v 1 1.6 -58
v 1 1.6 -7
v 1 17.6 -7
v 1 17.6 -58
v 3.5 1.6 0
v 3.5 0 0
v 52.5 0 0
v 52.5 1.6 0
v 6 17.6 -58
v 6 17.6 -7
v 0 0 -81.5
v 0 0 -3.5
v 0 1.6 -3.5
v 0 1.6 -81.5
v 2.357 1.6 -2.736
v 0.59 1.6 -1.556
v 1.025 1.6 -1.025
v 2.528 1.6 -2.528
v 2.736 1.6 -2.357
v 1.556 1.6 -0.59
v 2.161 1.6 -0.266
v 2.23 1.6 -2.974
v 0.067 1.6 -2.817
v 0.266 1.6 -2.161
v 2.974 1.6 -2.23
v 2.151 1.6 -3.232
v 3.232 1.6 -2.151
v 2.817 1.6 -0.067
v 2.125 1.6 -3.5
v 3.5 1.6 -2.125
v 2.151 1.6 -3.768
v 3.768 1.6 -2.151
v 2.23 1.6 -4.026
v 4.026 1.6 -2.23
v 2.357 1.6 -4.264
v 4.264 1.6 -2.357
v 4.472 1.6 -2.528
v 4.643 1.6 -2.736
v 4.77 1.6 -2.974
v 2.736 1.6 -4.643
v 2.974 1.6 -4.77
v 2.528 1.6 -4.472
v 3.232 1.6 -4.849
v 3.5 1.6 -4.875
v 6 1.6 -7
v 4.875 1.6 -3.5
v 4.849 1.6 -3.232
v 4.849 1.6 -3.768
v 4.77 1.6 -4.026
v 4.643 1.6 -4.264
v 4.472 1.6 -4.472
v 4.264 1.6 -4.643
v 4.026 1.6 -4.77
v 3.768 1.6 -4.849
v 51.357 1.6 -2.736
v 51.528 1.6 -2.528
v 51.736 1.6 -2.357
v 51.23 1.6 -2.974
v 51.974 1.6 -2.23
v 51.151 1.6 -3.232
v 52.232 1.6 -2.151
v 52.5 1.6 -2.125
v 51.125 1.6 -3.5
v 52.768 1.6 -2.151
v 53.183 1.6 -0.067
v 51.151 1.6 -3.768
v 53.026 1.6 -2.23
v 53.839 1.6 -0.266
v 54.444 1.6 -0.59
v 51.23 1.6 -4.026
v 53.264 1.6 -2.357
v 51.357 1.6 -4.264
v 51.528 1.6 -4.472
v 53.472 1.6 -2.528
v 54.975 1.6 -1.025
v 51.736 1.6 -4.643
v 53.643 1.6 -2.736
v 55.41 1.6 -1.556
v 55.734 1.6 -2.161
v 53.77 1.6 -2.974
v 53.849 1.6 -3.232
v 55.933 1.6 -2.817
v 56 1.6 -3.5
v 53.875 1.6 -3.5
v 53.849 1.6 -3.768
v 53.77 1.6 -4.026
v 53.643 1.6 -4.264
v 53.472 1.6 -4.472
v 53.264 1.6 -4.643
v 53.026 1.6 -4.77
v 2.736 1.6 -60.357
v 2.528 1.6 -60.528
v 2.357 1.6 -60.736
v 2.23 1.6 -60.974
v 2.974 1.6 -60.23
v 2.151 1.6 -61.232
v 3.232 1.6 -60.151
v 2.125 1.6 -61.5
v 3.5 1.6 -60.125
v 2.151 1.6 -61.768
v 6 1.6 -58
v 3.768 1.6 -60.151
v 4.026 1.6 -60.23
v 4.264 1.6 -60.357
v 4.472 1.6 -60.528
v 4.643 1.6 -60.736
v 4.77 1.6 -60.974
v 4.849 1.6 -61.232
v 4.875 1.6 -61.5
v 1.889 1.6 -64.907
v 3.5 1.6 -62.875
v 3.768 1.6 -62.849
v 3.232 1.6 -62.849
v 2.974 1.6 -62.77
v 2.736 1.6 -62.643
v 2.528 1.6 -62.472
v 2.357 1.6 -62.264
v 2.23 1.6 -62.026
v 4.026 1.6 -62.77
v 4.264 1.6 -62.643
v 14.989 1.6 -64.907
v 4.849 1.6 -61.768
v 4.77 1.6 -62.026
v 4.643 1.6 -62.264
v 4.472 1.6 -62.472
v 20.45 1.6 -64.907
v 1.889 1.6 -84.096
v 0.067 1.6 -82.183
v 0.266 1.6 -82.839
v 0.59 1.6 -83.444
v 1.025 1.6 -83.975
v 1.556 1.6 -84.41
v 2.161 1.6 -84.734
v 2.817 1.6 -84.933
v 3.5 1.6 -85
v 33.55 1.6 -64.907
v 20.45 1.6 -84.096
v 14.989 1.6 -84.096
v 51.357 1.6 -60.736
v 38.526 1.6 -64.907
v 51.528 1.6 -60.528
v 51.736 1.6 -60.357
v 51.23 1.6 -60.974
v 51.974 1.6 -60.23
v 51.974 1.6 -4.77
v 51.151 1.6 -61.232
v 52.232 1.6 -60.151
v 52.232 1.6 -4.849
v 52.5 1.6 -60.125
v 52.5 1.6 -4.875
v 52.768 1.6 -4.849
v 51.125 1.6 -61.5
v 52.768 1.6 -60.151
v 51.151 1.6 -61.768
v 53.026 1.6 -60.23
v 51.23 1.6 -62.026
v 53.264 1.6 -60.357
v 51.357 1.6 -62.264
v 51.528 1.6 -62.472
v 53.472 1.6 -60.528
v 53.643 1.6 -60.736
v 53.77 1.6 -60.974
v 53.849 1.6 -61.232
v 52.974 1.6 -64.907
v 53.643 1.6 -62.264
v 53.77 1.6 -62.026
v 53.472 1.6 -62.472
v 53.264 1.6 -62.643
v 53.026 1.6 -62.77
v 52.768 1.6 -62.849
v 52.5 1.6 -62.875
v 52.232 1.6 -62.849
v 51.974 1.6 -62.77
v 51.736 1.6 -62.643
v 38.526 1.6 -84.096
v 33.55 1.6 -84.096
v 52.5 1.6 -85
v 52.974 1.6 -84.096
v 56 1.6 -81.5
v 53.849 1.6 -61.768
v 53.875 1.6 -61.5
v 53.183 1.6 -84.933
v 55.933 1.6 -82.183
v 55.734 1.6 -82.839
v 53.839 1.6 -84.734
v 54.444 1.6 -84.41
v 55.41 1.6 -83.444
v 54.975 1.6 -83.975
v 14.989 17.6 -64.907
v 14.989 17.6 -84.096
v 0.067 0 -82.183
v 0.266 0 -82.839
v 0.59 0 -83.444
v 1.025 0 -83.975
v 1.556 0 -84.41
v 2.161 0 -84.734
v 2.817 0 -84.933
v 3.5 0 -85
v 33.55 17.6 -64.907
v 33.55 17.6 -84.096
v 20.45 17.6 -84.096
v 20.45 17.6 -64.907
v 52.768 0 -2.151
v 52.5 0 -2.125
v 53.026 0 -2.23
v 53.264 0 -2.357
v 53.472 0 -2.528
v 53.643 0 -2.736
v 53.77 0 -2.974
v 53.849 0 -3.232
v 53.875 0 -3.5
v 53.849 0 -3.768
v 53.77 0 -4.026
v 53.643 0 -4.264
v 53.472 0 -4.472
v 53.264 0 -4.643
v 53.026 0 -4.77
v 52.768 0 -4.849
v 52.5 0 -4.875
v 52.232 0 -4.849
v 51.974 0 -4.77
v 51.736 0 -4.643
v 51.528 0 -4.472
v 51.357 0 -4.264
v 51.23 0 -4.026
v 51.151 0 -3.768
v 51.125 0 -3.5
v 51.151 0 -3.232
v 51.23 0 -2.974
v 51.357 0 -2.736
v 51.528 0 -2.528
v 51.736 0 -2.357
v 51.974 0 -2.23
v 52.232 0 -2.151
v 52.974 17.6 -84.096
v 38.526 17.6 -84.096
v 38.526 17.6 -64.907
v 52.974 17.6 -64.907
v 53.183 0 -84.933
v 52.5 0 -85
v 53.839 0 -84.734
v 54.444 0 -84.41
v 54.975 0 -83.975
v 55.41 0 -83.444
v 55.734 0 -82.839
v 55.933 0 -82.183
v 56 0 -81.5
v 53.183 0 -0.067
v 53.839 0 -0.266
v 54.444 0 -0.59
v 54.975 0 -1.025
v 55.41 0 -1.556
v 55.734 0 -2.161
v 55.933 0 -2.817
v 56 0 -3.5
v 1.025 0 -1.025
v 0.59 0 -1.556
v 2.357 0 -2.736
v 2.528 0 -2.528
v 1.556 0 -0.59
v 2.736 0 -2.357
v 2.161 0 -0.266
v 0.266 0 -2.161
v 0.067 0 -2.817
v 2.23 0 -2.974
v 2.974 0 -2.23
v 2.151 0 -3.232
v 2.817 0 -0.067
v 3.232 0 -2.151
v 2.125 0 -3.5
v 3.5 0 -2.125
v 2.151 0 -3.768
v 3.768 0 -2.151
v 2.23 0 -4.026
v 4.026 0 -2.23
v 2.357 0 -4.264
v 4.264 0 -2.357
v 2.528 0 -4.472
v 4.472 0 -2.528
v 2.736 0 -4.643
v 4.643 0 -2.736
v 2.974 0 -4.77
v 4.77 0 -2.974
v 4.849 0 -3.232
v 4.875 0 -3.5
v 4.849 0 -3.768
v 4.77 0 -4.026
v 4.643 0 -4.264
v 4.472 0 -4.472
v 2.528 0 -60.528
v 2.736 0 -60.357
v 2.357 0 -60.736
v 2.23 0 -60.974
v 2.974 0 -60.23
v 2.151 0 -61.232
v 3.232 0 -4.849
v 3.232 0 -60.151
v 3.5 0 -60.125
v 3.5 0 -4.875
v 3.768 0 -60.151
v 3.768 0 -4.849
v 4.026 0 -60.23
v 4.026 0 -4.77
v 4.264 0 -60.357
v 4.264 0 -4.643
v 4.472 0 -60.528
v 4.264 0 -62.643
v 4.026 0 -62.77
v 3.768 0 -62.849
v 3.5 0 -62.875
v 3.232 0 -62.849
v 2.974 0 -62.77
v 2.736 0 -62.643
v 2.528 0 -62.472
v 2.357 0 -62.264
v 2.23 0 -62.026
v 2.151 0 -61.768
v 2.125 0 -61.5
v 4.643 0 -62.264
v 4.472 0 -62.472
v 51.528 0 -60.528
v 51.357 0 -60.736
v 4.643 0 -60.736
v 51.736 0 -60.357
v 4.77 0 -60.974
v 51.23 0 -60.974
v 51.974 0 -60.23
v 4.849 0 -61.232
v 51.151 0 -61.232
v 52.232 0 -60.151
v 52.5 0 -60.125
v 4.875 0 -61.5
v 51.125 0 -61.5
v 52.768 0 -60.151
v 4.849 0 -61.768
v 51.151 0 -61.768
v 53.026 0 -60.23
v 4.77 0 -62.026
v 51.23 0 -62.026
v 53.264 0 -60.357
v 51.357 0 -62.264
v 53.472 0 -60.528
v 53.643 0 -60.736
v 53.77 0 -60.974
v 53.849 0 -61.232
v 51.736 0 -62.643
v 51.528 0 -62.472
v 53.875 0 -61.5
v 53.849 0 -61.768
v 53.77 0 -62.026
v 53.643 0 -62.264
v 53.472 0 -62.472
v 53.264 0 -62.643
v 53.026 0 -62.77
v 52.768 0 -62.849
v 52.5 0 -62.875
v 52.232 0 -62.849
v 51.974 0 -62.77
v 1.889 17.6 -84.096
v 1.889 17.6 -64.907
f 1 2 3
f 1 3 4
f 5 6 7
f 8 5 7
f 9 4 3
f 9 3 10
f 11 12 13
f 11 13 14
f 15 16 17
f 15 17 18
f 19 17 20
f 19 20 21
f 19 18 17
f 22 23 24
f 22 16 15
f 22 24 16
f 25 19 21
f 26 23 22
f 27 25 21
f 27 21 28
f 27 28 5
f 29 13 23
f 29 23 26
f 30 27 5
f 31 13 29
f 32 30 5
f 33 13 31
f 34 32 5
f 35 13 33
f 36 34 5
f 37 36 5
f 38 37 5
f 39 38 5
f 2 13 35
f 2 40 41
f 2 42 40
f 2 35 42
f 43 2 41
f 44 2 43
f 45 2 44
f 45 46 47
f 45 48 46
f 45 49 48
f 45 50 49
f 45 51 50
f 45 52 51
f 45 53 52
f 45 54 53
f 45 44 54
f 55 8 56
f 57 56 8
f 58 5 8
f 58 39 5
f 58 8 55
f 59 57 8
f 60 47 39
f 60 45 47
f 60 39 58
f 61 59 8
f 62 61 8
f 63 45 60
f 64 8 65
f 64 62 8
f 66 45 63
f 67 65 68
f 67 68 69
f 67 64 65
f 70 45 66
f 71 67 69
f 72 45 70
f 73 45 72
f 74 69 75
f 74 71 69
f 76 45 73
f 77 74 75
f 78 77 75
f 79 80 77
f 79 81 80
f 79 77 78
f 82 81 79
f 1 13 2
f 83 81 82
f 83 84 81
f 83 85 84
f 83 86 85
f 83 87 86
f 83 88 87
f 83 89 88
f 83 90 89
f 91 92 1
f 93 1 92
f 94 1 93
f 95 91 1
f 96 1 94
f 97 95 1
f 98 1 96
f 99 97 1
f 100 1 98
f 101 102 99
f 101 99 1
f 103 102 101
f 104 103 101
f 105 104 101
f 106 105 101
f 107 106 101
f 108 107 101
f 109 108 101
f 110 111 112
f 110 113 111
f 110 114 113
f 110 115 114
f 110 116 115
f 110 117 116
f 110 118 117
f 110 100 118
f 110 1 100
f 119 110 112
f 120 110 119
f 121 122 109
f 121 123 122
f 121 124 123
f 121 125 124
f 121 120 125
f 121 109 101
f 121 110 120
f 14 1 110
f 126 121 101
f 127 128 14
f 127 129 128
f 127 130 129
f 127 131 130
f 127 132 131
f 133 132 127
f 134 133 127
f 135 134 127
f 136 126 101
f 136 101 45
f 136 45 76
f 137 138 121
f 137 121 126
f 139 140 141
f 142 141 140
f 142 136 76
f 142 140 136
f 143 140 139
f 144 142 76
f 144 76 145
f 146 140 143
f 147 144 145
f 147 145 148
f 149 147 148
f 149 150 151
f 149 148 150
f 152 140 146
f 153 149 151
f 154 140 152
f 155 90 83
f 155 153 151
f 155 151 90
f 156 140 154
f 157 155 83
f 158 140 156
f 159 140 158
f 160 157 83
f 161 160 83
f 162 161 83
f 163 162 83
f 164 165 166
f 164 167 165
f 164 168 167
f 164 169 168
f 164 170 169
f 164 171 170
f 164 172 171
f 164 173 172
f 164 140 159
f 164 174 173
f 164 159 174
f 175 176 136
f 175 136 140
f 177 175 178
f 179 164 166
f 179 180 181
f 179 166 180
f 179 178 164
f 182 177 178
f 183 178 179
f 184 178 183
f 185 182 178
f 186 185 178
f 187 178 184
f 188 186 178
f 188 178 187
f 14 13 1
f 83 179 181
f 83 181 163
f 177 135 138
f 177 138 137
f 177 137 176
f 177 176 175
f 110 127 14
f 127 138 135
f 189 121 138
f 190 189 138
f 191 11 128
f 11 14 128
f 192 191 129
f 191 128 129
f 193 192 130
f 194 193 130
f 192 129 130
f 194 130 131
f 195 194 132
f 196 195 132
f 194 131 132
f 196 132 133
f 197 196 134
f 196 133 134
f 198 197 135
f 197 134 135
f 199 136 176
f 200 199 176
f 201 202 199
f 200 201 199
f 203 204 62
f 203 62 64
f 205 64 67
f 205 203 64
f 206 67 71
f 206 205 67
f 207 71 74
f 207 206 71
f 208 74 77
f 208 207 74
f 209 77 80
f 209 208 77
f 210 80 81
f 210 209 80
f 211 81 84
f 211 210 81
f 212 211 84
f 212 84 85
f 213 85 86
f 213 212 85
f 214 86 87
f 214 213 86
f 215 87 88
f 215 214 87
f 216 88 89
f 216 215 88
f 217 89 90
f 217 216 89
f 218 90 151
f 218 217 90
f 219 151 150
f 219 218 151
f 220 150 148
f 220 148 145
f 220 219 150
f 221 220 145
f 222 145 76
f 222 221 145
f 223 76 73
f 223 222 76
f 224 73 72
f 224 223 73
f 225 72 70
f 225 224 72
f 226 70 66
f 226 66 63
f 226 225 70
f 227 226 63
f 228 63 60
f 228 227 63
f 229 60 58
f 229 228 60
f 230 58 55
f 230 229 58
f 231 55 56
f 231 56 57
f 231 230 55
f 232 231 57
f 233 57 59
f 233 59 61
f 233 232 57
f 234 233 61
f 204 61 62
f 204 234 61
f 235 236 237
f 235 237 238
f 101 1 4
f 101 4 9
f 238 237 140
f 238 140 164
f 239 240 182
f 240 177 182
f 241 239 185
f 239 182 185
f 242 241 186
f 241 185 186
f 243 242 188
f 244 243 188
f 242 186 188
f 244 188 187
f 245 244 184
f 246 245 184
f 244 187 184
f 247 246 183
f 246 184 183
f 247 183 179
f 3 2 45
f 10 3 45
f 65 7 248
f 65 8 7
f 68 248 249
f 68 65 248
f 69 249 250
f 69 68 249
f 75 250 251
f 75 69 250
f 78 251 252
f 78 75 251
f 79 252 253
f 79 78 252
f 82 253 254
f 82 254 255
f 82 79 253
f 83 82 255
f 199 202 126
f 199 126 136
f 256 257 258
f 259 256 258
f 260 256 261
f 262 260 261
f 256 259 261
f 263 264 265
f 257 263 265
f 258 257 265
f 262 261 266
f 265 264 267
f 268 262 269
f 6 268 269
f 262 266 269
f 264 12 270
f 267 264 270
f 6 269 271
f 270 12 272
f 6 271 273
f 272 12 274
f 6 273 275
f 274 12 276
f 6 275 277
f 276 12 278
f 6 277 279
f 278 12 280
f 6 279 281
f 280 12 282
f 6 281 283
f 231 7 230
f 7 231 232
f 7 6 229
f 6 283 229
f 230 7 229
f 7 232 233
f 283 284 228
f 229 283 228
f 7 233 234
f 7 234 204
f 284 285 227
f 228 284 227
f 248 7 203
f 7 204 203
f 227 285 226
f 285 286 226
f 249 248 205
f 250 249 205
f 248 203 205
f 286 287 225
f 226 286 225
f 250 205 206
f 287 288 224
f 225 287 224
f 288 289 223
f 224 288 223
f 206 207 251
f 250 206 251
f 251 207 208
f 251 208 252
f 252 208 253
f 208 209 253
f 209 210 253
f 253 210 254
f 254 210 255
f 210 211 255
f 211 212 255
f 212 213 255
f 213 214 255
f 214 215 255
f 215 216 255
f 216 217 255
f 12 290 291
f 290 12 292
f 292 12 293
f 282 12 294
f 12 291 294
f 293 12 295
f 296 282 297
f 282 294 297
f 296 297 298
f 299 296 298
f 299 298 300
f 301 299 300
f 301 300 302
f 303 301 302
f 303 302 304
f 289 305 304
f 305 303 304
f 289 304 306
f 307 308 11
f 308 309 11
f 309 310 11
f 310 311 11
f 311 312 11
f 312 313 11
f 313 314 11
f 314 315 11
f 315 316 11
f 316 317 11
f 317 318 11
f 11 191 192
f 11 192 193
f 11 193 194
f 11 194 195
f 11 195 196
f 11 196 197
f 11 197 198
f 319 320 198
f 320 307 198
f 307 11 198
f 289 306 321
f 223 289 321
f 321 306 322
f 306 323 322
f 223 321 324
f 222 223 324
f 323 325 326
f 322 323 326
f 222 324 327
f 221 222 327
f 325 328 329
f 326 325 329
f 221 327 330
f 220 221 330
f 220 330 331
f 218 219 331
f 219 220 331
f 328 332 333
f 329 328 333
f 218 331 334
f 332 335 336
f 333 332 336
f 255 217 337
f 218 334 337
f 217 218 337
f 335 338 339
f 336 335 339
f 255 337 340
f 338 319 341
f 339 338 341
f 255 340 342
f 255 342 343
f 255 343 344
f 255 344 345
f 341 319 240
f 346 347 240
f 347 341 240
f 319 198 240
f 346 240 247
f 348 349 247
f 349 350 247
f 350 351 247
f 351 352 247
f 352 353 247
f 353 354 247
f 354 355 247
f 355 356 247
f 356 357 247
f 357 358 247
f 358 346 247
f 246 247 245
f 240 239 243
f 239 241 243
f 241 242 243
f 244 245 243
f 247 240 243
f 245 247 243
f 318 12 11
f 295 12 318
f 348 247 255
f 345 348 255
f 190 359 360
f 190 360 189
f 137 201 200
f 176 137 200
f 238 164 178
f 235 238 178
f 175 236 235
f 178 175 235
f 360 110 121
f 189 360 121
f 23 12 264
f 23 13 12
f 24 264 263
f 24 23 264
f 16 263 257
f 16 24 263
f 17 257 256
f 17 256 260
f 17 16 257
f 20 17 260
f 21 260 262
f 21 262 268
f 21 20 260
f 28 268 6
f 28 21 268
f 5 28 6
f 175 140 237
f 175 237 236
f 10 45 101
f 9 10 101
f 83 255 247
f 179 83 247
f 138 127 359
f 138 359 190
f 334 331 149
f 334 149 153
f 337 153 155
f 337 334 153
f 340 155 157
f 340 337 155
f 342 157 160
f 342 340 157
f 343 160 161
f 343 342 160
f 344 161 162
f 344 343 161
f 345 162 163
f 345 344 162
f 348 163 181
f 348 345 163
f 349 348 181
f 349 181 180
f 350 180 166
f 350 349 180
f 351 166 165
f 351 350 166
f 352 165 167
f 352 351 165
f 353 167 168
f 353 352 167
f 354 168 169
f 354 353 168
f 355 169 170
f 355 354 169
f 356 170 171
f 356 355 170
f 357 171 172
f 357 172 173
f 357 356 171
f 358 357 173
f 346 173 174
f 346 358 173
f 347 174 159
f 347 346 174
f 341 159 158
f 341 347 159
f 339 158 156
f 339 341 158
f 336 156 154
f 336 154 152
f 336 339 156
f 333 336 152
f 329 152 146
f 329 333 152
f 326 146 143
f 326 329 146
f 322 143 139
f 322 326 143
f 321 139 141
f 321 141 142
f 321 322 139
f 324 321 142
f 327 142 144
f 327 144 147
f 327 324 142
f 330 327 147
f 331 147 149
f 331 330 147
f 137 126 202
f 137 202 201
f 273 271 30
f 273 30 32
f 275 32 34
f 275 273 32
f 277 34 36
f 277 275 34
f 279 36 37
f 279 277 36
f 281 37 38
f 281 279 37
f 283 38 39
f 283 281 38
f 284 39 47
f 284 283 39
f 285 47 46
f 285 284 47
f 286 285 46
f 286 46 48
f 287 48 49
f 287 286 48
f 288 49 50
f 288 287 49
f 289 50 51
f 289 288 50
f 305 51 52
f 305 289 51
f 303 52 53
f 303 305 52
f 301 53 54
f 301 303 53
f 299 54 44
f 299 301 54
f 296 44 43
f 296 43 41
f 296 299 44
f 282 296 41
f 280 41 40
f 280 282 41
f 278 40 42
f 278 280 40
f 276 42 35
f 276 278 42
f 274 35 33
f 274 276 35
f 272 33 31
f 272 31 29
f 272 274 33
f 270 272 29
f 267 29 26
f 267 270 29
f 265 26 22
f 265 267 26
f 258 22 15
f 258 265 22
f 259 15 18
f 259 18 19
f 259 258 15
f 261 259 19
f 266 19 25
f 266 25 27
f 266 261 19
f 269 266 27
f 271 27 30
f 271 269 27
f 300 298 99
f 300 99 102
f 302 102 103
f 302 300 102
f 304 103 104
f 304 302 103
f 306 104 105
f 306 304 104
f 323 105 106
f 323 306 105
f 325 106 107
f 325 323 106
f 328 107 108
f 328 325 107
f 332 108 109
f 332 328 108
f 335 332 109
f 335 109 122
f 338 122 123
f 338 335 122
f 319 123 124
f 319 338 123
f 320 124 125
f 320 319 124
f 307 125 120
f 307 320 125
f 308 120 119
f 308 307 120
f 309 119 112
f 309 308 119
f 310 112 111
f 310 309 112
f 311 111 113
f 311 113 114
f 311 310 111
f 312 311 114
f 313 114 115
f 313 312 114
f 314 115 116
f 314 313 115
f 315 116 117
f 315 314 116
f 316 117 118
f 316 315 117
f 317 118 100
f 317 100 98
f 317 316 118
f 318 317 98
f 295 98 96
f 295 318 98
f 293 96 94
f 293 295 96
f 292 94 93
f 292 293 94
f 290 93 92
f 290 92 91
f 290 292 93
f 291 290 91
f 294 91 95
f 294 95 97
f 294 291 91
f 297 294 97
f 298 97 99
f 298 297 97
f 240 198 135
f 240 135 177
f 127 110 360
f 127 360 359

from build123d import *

# Parameters (mm, degrees)
SKETCH1_W           = 56
SKETCH1_H           = 85
SKETCH1_R           = 1.375
BOSS_EXTRUDE1_DEPTH = 1.6
FILLET1_R           = 3.5
SKETCH3_W           = 13.1
SKETCH3_H           = 19.189632287
SKETCH3_W_2         = 14.44866431
BOSS_EXTRUDE2_DEPTH = 16
SKETCH5_W           = 5
SKETCH5_H           = 51
BOSS_EXTRUDE3_DEPTH = 16


with BuildPart() as part:
    # Sketch1 → Boss-Extrude1 (new body)
    with BuildSketch(Plane(origin=(0, 0, 0), x_dir=(1, 0, 0), z_dir=(0, 1, 0))):
        with Locations((28, 42.5)):
            Rectangle(SKETCH1_W, SKETCH1_H)
        with Locations(Location((3.5, 3.5, 0), (0, 0, 270))):
            Circle(SKETCH1_R, mode=Mode.SUBTRACT)
        with Locations(Location((52.5, 3.5, 0), (0, 0, 270))):
            Circle(SKETCH1_R, mode=Mode.SUBTRACT)
        with Locations(Location((52.5, 61.5, 0), (0, 0, 270))):
            Circle(SKETCH1_R, mode=Mode.SUBTRACT)
        with Locations(Location((3.5, 61.5, 0), (0, 0, 270))):
            Circle(SKETCH1_R, mode=Mode.SUBTRACT)
    extrude(amount=BOSS_EXTRUDE1_DEPTH)

    # Fillet1
    fillet1_edges = [part.edges().sort_by_distance(p)[0] for p in [
        (0, 0.8, -85),
        (56, 0.8, -85),
        (56, 0.8, 0),
        (0, 0.8, 0),
    ]]
    fillet(fillet1_edges, radius=FILLET1_R)

    # Sketch3 → Boss-Extrude2 (add)
    with BuildSketch(Plane(origin=(0, 1.6, 0), x_dir=(1, 0, 0), z_dir=(0, 1, 0))):
        with Locations((8.438548035, 74.501533843)):
            Rectangle(SKETCH3_W, SKETCH3_H)
        with Locations((27, 74.501533843)):
            Rectangle(SKETCH3_W, SKETCH3_H)
        with Locations((45.75, 74.501533843)):
            Rectangle(SKETCH3_W_2, SKETCH3_H)
    extrude(amount=BOSS_EXTRUDE2_DEPTH)

    # Sketch5 → Boss-Extrude3 (add)
    with BuildSketch(Plane(origin=(0, 1.6, 0), x_dir=(1, 0, 0), z_dir=(0, 1, 0))):
        with Locations((3.5, 32.5)):
            Rectangle(SKETCH5_W, SKETCH5_H)
    extrude(amount=BOSS_EXTRUDE3_DEPTH)


solid = part.part
